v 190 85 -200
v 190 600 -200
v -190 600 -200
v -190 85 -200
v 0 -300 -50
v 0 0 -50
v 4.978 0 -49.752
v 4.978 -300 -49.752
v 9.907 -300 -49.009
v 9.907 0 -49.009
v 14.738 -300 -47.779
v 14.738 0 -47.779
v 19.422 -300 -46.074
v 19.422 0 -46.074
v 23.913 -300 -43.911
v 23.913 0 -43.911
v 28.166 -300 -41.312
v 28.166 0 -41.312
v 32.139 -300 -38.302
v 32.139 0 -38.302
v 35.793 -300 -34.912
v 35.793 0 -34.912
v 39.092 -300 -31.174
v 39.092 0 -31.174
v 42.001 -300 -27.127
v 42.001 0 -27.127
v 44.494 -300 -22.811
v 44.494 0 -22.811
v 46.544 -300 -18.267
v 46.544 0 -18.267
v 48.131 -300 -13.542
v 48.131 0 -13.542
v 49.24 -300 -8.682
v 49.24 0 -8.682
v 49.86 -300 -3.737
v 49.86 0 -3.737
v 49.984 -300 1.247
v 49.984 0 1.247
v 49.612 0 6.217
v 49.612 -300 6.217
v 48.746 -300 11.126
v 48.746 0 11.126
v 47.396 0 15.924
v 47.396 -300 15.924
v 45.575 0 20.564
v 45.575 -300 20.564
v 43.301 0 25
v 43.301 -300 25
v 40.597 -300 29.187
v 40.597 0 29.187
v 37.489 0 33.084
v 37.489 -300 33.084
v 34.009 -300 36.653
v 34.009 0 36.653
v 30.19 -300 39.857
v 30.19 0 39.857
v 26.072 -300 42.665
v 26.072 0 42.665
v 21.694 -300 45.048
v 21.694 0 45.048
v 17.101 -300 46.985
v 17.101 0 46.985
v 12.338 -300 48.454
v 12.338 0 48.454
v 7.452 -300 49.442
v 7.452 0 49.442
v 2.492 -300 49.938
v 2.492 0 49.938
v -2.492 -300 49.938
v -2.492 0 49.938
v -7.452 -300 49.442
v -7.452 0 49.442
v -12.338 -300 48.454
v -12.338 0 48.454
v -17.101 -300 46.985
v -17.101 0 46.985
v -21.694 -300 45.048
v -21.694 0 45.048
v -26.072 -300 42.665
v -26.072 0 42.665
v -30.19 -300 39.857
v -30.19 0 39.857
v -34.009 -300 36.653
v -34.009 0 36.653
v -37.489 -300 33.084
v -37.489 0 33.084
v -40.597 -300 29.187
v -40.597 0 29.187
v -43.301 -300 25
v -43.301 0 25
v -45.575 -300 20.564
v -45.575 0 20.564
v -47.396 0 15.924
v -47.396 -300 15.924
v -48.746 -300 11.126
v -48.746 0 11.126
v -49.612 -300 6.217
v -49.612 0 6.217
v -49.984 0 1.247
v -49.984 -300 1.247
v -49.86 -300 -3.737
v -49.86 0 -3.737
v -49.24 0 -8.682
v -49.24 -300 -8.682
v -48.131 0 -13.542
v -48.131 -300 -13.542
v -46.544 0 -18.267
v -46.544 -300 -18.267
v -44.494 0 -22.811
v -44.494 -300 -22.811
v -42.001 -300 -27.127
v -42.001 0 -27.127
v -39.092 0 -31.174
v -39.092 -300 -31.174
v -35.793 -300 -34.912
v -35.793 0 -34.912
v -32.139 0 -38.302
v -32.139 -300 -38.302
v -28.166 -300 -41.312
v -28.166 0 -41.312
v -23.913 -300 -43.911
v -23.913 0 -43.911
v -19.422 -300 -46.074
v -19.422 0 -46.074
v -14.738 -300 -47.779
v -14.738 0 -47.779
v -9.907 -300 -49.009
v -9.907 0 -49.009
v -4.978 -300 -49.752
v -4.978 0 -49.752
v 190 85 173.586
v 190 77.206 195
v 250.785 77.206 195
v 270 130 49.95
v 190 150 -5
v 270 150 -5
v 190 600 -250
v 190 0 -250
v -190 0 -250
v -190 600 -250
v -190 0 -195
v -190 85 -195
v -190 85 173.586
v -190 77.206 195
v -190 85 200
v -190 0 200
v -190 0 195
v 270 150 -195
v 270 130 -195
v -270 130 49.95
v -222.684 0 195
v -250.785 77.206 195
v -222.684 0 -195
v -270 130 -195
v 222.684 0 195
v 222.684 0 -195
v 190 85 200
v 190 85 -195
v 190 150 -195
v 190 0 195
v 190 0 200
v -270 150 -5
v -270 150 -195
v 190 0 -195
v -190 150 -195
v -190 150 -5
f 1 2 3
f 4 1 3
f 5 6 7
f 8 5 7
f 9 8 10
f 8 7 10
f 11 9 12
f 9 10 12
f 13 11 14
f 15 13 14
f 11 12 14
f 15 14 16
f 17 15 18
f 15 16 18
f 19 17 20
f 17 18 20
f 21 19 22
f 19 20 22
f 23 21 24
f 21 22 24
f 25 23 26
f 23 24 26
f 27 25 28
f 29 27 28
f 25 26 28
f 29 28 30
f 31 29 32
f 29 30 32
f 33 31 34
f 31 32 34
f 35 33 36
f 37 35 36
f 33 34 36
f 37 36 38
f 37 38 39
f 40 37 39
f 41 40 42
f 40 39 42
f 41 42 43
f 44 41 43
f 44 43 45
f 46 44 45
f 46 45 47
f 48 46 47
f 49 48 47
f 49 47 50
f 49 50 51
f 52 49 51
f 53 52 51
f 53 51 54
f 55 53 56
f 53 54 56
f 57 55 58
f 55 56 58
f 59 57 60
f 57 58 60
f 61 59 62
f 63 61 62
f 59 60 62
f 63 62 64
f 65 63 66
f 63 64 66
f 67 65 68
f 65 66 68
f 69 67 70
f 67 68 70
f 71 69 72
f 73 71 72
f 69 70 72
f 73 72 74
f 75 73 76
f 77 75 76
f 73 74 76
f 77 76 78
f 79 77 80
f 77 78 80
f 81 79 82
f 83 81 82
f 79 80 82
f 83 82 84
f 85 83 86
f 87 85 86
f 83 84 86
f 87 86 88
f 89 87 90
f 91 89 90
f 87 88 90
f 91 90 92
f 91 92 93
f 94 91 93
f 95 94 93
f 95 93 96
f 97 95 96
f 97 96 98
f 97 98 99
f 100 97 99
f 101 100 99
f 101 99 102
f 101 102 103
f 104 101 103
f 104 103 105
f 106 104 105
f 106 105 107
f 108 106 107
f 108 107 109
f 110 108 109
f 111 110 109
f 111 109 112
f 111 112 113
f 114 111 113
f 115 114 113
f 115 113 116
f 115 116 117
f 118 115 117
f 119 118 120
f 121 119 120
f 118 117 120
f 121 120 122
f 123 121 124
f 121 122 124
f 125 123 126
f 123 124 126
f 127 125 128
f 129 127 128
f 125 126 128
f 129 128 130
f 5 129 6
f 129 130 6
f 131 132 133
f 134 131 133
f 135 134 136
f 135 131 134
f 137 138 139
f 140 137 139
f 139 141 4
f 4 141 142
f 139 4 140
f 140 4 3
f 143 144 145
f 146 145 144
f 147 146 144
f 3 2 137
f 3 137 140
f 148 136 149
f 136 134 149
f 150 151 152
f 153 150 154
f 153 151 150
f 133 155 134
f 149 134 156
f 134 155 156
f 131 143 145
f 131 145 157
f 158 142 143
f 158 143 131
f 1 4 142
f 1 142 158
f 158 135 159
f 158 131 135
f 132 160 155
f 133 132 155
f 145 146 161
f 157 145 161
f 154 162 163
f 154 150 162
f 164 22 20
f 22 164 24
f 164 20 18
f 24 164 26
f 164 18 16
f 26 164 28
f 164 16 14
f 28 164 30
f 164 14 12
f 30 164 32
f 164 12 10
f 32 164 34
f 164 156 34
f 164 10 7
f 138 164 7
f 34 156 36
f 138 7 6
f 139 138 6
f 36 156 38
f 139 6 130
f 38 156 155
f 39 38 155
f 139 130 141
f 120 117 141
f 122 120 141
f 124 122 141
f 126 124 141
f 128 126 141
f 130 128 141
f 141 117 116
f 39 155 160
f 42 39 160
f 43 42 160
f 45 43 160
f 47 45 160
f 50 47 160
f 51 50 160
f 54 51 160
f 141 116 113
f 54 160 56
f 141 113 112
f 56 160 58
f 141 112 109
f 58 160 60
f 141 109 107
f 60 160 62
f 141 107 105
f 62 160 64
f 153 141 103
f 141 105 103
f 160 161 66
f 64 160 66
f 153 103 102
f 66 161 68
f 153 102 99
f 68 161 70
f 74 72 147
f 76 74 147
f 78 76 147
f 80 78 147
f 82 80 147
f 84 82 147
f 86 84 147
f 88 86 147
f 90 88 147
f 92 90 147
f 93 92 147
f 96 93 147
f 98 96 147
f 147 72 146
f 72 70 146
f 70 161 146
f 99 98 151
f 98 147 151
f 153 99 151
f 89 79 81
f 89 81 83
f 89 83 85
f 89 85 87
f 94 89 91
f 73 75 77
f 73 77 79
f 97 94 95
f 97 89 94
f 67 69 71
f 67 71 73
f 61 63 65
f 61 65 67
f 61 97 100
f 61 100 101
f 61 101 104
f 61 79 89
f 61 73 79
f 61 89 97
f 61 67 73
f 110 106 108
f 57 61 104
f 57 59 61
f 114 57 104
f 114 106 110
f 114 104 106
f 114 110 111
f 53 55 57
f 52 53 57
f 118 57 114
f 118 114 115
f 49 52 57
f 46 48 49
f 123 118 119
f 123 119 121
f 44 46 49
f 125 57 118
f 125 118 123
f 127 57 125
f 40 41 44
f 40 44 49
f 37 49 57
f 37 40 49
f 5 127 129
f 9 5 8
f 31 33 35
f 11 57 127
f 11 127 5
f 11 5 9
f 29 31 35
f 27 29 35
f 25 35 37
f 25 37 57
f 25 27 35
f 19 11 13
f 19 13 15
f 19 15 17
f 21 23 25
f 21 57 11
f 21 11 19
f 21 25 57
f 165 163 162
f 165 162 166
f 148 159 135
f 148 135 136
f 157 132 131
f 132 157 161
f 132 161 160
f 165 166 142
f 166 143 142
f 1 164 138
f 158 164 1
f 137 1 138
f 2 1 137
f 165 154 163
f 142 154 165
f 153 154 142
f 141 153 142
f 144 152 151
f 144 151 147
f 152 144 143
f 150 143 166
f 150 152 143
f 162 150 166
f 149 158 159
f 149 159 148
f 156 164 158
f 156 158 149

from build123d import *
from OCP.BRepFilletAPI import BRepFilletAPI_MakeChamfer

# Parameters (mm, degrees)
SKETCH1_W           = 380
SKETCH1_H           = 400
BOSS_EXTRUDE1_DEPTH = 85
SKETCH2_W           = 80
SKETCH2_H           = 390
BOSS_EXTRUDE2_DEPTH = 150
CHAMFER1_SIZE       = 72.794046853
CHAMFER1_SIZE_2     = 200
CHAMFER2_SIZE       = 130
CHAMFER2_SIZE2      = 47.316130455
SKETCH3_W           = 380
SKETCH3_H           = 600
BOSS_EXTRUDE3_DEPTH = 50
SKETCH4_R           = 50
BOSS_EXTRUDE4_DEPTH = 300


with BuildPart() as part:
    # Sketch1 → Boss-Extrude1 (new body)
    with BuildSketch(Plane(origin=(0, 0, 0), x_dir=(1, 0, 0), z_dir=(0, 1, 0))):
        Rectangle(SKETCH1_W, SKETCH1_H)
    extrude(amount=BOSS_EXTRUDE1_DEPTH)

    # Sketch2 → Boss-Extrude2 (add)
    with BuildSketch(Plane(origin=(0, 0, 0), x_dir=(1, 0, 0), z_dir=(0, 1, 0))):
        with Locations((-230, 0)):
            Rectangle(SKETCH2_W, SKETCH2_H)
        with Locations((230, 0)):
            Rectangle(SKETCH2_W, SKETCH2_H)
    extrude(amount=BOSS_EXTRUDE2_DEPTH)

    # Chamfer1
    # the kernel refuses this chamfer: 200, 72.794046853 mm, written as the material it takes off along each edge
    with BuildSketch(Plane(origin=(-788.83894651, 150, 195), x_dir=(0, -0.9950833631817488, 0.09904090225204945), z_dir=(1, 0, 0)), Plane(origin=(190, 150, 195), x_dir=(0, -0.9950833631817488, 0.09904090225204945), z_dir=(1, 0, 0))) as chamfer1_piece_1:
        Polygon((CHAMFER1_SIZE * 0.995083363185, CHAMFER1_SIZE * 0.0990409022524), (-CHAMFER1_SIZE_2 * 0.099040902252, CHAMFER1_SIZE_2 * 0.995083363182), (0, 0), align=None)
    extrude(amount=598.83894651, mode=Mode.SUBTRACT)
    with BuildSketch(Plane(origin=(-788.83894651, 150, 195), x_dir=(0, -0.9950833631817488, 0.09904090225204945), z_dir=(1, 0, 0))) as chamfer1_piece_2_section:
        Polygon((CHAMFER1_SIZE * 0.995083363185, CHAMFER1_SIZE * 0.0990409022524), (-CHAMFER1_SIZE_2 * 0.099040902252, CHAMFER1_SIZE_2 * 0.995083363182), (0, 0), align=None)
    chamfer1_piece_2 = extrude(amount=1117.67789302, mode=Mode.PRIVATE)
    chamfer1_piece_2 = split(chamfer1_piece_2, bisect_by=Plane(origin=(190, 82.401984382, 187.862010755), z_dir=(1, 0, 0)), keep=Keep.TOP, mode=Mode.PRIVATE)
    add(chamfer1_piece_2, mode=Mode.SUBTRACT)
    with BuildSketch(Plane(origin=(-328.83894651, 150, 195), x_dir=(0, -0.9950833631817488, 0.09904090225204945), z_dir=(1, 0, 0))) as chamfer1_piece_3_section:
        Polygon((CHAMFER1_SIZE * 0.995083363185, CHAMFER1_SIZE * 0.0990409022524), (-CHAMFER1_SIZE_2 * 0.099040902252, CHAMFER1_SIZE_2 * 0.995083363182), (0, 0), align=None)
    chamfer1_piece_3 = extrude(amount=1117.67789302, mode=Mode.PRIVATE)
    chamfer1_piece_3 = split(chamfer1_piece_3, bisect_by=Plane(origin=(-190, 82.401984382, 187.862010755), z_dir=(-1, 0, 0)), keep=Keep.TOP, mode=Mode.PRIVATE)
    add(chamfer1_piece_3, mode=Mode.SUBTRACT)

    # Chamfer2: one chamfer whose edges measure the first distance from different faces: ONE call of the kernel's chamfer builder (chamfer() names one face for all edges)
    chamfer2_edges_1 = [part.edges().sort_by_distance(p)[0] for p in [
        (270, 0, 0),
    ]]
    chamfer2_side_1 = [part.faces().sort_by_distance(p)[0] for p in [
        (270, 67.789562339, -18.238567166),
    ]]
    chamfer2_edges_2 = [part.edges().sort_by_distance(p)[0] for p in [
        (-270, 0, 0),
    ]]
    chamfer2_side_2 = [part.faces().sort_by_distance(p)[0] for p in [
        (-270, 67.789562339, -18.238567166),
    ]]
    chamfer2 = BRepFilletAPI_MakeChamfer(part.part.solid().wrapped)
    for e in chamfer2_edges_1:
        chamfer2.Add(CHAMFER2_SIZE, CHAMFER2_SIZE2, e.wrapped, chamfer2_side_1[0].wrapped)  # the first distance lies on this face
    for e in chamfer2_edges_2:
        chamfer2.Add(CHAMFER2_SIZE, CHAMFER2_SIZE2, e.wrapped, chamfer2_side_2[0].wrapped)  # the first distance lies on this face
    add(Compound.cast(chamfer2.Shape()), mode=Mode.REPLACE)

    # Sketch3 → Boss-Extrude3 (add)
    with BuildSketch(Plane(origin=(0, 0, -200), x_dir=(-1, 0, 0), z_dir=(0, 0, -1))):
        with Locations((0, 300)):
            Rectangle(SKETCH3_W, SKETCH3_H)
    extrude(amount=BOSS_EXTRUDE3_DEPTH)

    # Sketch4 → Boss-Extrude4 (add)
    with BuildSketch(Plane.XZ):
        with Locations(Location((0, 0, 0), (0, 0, 270))):
            Circle(SKETCH4_R)
    extrude(amount=BOSS_EXTRUDE4_DEPTH)


solid = part.part
